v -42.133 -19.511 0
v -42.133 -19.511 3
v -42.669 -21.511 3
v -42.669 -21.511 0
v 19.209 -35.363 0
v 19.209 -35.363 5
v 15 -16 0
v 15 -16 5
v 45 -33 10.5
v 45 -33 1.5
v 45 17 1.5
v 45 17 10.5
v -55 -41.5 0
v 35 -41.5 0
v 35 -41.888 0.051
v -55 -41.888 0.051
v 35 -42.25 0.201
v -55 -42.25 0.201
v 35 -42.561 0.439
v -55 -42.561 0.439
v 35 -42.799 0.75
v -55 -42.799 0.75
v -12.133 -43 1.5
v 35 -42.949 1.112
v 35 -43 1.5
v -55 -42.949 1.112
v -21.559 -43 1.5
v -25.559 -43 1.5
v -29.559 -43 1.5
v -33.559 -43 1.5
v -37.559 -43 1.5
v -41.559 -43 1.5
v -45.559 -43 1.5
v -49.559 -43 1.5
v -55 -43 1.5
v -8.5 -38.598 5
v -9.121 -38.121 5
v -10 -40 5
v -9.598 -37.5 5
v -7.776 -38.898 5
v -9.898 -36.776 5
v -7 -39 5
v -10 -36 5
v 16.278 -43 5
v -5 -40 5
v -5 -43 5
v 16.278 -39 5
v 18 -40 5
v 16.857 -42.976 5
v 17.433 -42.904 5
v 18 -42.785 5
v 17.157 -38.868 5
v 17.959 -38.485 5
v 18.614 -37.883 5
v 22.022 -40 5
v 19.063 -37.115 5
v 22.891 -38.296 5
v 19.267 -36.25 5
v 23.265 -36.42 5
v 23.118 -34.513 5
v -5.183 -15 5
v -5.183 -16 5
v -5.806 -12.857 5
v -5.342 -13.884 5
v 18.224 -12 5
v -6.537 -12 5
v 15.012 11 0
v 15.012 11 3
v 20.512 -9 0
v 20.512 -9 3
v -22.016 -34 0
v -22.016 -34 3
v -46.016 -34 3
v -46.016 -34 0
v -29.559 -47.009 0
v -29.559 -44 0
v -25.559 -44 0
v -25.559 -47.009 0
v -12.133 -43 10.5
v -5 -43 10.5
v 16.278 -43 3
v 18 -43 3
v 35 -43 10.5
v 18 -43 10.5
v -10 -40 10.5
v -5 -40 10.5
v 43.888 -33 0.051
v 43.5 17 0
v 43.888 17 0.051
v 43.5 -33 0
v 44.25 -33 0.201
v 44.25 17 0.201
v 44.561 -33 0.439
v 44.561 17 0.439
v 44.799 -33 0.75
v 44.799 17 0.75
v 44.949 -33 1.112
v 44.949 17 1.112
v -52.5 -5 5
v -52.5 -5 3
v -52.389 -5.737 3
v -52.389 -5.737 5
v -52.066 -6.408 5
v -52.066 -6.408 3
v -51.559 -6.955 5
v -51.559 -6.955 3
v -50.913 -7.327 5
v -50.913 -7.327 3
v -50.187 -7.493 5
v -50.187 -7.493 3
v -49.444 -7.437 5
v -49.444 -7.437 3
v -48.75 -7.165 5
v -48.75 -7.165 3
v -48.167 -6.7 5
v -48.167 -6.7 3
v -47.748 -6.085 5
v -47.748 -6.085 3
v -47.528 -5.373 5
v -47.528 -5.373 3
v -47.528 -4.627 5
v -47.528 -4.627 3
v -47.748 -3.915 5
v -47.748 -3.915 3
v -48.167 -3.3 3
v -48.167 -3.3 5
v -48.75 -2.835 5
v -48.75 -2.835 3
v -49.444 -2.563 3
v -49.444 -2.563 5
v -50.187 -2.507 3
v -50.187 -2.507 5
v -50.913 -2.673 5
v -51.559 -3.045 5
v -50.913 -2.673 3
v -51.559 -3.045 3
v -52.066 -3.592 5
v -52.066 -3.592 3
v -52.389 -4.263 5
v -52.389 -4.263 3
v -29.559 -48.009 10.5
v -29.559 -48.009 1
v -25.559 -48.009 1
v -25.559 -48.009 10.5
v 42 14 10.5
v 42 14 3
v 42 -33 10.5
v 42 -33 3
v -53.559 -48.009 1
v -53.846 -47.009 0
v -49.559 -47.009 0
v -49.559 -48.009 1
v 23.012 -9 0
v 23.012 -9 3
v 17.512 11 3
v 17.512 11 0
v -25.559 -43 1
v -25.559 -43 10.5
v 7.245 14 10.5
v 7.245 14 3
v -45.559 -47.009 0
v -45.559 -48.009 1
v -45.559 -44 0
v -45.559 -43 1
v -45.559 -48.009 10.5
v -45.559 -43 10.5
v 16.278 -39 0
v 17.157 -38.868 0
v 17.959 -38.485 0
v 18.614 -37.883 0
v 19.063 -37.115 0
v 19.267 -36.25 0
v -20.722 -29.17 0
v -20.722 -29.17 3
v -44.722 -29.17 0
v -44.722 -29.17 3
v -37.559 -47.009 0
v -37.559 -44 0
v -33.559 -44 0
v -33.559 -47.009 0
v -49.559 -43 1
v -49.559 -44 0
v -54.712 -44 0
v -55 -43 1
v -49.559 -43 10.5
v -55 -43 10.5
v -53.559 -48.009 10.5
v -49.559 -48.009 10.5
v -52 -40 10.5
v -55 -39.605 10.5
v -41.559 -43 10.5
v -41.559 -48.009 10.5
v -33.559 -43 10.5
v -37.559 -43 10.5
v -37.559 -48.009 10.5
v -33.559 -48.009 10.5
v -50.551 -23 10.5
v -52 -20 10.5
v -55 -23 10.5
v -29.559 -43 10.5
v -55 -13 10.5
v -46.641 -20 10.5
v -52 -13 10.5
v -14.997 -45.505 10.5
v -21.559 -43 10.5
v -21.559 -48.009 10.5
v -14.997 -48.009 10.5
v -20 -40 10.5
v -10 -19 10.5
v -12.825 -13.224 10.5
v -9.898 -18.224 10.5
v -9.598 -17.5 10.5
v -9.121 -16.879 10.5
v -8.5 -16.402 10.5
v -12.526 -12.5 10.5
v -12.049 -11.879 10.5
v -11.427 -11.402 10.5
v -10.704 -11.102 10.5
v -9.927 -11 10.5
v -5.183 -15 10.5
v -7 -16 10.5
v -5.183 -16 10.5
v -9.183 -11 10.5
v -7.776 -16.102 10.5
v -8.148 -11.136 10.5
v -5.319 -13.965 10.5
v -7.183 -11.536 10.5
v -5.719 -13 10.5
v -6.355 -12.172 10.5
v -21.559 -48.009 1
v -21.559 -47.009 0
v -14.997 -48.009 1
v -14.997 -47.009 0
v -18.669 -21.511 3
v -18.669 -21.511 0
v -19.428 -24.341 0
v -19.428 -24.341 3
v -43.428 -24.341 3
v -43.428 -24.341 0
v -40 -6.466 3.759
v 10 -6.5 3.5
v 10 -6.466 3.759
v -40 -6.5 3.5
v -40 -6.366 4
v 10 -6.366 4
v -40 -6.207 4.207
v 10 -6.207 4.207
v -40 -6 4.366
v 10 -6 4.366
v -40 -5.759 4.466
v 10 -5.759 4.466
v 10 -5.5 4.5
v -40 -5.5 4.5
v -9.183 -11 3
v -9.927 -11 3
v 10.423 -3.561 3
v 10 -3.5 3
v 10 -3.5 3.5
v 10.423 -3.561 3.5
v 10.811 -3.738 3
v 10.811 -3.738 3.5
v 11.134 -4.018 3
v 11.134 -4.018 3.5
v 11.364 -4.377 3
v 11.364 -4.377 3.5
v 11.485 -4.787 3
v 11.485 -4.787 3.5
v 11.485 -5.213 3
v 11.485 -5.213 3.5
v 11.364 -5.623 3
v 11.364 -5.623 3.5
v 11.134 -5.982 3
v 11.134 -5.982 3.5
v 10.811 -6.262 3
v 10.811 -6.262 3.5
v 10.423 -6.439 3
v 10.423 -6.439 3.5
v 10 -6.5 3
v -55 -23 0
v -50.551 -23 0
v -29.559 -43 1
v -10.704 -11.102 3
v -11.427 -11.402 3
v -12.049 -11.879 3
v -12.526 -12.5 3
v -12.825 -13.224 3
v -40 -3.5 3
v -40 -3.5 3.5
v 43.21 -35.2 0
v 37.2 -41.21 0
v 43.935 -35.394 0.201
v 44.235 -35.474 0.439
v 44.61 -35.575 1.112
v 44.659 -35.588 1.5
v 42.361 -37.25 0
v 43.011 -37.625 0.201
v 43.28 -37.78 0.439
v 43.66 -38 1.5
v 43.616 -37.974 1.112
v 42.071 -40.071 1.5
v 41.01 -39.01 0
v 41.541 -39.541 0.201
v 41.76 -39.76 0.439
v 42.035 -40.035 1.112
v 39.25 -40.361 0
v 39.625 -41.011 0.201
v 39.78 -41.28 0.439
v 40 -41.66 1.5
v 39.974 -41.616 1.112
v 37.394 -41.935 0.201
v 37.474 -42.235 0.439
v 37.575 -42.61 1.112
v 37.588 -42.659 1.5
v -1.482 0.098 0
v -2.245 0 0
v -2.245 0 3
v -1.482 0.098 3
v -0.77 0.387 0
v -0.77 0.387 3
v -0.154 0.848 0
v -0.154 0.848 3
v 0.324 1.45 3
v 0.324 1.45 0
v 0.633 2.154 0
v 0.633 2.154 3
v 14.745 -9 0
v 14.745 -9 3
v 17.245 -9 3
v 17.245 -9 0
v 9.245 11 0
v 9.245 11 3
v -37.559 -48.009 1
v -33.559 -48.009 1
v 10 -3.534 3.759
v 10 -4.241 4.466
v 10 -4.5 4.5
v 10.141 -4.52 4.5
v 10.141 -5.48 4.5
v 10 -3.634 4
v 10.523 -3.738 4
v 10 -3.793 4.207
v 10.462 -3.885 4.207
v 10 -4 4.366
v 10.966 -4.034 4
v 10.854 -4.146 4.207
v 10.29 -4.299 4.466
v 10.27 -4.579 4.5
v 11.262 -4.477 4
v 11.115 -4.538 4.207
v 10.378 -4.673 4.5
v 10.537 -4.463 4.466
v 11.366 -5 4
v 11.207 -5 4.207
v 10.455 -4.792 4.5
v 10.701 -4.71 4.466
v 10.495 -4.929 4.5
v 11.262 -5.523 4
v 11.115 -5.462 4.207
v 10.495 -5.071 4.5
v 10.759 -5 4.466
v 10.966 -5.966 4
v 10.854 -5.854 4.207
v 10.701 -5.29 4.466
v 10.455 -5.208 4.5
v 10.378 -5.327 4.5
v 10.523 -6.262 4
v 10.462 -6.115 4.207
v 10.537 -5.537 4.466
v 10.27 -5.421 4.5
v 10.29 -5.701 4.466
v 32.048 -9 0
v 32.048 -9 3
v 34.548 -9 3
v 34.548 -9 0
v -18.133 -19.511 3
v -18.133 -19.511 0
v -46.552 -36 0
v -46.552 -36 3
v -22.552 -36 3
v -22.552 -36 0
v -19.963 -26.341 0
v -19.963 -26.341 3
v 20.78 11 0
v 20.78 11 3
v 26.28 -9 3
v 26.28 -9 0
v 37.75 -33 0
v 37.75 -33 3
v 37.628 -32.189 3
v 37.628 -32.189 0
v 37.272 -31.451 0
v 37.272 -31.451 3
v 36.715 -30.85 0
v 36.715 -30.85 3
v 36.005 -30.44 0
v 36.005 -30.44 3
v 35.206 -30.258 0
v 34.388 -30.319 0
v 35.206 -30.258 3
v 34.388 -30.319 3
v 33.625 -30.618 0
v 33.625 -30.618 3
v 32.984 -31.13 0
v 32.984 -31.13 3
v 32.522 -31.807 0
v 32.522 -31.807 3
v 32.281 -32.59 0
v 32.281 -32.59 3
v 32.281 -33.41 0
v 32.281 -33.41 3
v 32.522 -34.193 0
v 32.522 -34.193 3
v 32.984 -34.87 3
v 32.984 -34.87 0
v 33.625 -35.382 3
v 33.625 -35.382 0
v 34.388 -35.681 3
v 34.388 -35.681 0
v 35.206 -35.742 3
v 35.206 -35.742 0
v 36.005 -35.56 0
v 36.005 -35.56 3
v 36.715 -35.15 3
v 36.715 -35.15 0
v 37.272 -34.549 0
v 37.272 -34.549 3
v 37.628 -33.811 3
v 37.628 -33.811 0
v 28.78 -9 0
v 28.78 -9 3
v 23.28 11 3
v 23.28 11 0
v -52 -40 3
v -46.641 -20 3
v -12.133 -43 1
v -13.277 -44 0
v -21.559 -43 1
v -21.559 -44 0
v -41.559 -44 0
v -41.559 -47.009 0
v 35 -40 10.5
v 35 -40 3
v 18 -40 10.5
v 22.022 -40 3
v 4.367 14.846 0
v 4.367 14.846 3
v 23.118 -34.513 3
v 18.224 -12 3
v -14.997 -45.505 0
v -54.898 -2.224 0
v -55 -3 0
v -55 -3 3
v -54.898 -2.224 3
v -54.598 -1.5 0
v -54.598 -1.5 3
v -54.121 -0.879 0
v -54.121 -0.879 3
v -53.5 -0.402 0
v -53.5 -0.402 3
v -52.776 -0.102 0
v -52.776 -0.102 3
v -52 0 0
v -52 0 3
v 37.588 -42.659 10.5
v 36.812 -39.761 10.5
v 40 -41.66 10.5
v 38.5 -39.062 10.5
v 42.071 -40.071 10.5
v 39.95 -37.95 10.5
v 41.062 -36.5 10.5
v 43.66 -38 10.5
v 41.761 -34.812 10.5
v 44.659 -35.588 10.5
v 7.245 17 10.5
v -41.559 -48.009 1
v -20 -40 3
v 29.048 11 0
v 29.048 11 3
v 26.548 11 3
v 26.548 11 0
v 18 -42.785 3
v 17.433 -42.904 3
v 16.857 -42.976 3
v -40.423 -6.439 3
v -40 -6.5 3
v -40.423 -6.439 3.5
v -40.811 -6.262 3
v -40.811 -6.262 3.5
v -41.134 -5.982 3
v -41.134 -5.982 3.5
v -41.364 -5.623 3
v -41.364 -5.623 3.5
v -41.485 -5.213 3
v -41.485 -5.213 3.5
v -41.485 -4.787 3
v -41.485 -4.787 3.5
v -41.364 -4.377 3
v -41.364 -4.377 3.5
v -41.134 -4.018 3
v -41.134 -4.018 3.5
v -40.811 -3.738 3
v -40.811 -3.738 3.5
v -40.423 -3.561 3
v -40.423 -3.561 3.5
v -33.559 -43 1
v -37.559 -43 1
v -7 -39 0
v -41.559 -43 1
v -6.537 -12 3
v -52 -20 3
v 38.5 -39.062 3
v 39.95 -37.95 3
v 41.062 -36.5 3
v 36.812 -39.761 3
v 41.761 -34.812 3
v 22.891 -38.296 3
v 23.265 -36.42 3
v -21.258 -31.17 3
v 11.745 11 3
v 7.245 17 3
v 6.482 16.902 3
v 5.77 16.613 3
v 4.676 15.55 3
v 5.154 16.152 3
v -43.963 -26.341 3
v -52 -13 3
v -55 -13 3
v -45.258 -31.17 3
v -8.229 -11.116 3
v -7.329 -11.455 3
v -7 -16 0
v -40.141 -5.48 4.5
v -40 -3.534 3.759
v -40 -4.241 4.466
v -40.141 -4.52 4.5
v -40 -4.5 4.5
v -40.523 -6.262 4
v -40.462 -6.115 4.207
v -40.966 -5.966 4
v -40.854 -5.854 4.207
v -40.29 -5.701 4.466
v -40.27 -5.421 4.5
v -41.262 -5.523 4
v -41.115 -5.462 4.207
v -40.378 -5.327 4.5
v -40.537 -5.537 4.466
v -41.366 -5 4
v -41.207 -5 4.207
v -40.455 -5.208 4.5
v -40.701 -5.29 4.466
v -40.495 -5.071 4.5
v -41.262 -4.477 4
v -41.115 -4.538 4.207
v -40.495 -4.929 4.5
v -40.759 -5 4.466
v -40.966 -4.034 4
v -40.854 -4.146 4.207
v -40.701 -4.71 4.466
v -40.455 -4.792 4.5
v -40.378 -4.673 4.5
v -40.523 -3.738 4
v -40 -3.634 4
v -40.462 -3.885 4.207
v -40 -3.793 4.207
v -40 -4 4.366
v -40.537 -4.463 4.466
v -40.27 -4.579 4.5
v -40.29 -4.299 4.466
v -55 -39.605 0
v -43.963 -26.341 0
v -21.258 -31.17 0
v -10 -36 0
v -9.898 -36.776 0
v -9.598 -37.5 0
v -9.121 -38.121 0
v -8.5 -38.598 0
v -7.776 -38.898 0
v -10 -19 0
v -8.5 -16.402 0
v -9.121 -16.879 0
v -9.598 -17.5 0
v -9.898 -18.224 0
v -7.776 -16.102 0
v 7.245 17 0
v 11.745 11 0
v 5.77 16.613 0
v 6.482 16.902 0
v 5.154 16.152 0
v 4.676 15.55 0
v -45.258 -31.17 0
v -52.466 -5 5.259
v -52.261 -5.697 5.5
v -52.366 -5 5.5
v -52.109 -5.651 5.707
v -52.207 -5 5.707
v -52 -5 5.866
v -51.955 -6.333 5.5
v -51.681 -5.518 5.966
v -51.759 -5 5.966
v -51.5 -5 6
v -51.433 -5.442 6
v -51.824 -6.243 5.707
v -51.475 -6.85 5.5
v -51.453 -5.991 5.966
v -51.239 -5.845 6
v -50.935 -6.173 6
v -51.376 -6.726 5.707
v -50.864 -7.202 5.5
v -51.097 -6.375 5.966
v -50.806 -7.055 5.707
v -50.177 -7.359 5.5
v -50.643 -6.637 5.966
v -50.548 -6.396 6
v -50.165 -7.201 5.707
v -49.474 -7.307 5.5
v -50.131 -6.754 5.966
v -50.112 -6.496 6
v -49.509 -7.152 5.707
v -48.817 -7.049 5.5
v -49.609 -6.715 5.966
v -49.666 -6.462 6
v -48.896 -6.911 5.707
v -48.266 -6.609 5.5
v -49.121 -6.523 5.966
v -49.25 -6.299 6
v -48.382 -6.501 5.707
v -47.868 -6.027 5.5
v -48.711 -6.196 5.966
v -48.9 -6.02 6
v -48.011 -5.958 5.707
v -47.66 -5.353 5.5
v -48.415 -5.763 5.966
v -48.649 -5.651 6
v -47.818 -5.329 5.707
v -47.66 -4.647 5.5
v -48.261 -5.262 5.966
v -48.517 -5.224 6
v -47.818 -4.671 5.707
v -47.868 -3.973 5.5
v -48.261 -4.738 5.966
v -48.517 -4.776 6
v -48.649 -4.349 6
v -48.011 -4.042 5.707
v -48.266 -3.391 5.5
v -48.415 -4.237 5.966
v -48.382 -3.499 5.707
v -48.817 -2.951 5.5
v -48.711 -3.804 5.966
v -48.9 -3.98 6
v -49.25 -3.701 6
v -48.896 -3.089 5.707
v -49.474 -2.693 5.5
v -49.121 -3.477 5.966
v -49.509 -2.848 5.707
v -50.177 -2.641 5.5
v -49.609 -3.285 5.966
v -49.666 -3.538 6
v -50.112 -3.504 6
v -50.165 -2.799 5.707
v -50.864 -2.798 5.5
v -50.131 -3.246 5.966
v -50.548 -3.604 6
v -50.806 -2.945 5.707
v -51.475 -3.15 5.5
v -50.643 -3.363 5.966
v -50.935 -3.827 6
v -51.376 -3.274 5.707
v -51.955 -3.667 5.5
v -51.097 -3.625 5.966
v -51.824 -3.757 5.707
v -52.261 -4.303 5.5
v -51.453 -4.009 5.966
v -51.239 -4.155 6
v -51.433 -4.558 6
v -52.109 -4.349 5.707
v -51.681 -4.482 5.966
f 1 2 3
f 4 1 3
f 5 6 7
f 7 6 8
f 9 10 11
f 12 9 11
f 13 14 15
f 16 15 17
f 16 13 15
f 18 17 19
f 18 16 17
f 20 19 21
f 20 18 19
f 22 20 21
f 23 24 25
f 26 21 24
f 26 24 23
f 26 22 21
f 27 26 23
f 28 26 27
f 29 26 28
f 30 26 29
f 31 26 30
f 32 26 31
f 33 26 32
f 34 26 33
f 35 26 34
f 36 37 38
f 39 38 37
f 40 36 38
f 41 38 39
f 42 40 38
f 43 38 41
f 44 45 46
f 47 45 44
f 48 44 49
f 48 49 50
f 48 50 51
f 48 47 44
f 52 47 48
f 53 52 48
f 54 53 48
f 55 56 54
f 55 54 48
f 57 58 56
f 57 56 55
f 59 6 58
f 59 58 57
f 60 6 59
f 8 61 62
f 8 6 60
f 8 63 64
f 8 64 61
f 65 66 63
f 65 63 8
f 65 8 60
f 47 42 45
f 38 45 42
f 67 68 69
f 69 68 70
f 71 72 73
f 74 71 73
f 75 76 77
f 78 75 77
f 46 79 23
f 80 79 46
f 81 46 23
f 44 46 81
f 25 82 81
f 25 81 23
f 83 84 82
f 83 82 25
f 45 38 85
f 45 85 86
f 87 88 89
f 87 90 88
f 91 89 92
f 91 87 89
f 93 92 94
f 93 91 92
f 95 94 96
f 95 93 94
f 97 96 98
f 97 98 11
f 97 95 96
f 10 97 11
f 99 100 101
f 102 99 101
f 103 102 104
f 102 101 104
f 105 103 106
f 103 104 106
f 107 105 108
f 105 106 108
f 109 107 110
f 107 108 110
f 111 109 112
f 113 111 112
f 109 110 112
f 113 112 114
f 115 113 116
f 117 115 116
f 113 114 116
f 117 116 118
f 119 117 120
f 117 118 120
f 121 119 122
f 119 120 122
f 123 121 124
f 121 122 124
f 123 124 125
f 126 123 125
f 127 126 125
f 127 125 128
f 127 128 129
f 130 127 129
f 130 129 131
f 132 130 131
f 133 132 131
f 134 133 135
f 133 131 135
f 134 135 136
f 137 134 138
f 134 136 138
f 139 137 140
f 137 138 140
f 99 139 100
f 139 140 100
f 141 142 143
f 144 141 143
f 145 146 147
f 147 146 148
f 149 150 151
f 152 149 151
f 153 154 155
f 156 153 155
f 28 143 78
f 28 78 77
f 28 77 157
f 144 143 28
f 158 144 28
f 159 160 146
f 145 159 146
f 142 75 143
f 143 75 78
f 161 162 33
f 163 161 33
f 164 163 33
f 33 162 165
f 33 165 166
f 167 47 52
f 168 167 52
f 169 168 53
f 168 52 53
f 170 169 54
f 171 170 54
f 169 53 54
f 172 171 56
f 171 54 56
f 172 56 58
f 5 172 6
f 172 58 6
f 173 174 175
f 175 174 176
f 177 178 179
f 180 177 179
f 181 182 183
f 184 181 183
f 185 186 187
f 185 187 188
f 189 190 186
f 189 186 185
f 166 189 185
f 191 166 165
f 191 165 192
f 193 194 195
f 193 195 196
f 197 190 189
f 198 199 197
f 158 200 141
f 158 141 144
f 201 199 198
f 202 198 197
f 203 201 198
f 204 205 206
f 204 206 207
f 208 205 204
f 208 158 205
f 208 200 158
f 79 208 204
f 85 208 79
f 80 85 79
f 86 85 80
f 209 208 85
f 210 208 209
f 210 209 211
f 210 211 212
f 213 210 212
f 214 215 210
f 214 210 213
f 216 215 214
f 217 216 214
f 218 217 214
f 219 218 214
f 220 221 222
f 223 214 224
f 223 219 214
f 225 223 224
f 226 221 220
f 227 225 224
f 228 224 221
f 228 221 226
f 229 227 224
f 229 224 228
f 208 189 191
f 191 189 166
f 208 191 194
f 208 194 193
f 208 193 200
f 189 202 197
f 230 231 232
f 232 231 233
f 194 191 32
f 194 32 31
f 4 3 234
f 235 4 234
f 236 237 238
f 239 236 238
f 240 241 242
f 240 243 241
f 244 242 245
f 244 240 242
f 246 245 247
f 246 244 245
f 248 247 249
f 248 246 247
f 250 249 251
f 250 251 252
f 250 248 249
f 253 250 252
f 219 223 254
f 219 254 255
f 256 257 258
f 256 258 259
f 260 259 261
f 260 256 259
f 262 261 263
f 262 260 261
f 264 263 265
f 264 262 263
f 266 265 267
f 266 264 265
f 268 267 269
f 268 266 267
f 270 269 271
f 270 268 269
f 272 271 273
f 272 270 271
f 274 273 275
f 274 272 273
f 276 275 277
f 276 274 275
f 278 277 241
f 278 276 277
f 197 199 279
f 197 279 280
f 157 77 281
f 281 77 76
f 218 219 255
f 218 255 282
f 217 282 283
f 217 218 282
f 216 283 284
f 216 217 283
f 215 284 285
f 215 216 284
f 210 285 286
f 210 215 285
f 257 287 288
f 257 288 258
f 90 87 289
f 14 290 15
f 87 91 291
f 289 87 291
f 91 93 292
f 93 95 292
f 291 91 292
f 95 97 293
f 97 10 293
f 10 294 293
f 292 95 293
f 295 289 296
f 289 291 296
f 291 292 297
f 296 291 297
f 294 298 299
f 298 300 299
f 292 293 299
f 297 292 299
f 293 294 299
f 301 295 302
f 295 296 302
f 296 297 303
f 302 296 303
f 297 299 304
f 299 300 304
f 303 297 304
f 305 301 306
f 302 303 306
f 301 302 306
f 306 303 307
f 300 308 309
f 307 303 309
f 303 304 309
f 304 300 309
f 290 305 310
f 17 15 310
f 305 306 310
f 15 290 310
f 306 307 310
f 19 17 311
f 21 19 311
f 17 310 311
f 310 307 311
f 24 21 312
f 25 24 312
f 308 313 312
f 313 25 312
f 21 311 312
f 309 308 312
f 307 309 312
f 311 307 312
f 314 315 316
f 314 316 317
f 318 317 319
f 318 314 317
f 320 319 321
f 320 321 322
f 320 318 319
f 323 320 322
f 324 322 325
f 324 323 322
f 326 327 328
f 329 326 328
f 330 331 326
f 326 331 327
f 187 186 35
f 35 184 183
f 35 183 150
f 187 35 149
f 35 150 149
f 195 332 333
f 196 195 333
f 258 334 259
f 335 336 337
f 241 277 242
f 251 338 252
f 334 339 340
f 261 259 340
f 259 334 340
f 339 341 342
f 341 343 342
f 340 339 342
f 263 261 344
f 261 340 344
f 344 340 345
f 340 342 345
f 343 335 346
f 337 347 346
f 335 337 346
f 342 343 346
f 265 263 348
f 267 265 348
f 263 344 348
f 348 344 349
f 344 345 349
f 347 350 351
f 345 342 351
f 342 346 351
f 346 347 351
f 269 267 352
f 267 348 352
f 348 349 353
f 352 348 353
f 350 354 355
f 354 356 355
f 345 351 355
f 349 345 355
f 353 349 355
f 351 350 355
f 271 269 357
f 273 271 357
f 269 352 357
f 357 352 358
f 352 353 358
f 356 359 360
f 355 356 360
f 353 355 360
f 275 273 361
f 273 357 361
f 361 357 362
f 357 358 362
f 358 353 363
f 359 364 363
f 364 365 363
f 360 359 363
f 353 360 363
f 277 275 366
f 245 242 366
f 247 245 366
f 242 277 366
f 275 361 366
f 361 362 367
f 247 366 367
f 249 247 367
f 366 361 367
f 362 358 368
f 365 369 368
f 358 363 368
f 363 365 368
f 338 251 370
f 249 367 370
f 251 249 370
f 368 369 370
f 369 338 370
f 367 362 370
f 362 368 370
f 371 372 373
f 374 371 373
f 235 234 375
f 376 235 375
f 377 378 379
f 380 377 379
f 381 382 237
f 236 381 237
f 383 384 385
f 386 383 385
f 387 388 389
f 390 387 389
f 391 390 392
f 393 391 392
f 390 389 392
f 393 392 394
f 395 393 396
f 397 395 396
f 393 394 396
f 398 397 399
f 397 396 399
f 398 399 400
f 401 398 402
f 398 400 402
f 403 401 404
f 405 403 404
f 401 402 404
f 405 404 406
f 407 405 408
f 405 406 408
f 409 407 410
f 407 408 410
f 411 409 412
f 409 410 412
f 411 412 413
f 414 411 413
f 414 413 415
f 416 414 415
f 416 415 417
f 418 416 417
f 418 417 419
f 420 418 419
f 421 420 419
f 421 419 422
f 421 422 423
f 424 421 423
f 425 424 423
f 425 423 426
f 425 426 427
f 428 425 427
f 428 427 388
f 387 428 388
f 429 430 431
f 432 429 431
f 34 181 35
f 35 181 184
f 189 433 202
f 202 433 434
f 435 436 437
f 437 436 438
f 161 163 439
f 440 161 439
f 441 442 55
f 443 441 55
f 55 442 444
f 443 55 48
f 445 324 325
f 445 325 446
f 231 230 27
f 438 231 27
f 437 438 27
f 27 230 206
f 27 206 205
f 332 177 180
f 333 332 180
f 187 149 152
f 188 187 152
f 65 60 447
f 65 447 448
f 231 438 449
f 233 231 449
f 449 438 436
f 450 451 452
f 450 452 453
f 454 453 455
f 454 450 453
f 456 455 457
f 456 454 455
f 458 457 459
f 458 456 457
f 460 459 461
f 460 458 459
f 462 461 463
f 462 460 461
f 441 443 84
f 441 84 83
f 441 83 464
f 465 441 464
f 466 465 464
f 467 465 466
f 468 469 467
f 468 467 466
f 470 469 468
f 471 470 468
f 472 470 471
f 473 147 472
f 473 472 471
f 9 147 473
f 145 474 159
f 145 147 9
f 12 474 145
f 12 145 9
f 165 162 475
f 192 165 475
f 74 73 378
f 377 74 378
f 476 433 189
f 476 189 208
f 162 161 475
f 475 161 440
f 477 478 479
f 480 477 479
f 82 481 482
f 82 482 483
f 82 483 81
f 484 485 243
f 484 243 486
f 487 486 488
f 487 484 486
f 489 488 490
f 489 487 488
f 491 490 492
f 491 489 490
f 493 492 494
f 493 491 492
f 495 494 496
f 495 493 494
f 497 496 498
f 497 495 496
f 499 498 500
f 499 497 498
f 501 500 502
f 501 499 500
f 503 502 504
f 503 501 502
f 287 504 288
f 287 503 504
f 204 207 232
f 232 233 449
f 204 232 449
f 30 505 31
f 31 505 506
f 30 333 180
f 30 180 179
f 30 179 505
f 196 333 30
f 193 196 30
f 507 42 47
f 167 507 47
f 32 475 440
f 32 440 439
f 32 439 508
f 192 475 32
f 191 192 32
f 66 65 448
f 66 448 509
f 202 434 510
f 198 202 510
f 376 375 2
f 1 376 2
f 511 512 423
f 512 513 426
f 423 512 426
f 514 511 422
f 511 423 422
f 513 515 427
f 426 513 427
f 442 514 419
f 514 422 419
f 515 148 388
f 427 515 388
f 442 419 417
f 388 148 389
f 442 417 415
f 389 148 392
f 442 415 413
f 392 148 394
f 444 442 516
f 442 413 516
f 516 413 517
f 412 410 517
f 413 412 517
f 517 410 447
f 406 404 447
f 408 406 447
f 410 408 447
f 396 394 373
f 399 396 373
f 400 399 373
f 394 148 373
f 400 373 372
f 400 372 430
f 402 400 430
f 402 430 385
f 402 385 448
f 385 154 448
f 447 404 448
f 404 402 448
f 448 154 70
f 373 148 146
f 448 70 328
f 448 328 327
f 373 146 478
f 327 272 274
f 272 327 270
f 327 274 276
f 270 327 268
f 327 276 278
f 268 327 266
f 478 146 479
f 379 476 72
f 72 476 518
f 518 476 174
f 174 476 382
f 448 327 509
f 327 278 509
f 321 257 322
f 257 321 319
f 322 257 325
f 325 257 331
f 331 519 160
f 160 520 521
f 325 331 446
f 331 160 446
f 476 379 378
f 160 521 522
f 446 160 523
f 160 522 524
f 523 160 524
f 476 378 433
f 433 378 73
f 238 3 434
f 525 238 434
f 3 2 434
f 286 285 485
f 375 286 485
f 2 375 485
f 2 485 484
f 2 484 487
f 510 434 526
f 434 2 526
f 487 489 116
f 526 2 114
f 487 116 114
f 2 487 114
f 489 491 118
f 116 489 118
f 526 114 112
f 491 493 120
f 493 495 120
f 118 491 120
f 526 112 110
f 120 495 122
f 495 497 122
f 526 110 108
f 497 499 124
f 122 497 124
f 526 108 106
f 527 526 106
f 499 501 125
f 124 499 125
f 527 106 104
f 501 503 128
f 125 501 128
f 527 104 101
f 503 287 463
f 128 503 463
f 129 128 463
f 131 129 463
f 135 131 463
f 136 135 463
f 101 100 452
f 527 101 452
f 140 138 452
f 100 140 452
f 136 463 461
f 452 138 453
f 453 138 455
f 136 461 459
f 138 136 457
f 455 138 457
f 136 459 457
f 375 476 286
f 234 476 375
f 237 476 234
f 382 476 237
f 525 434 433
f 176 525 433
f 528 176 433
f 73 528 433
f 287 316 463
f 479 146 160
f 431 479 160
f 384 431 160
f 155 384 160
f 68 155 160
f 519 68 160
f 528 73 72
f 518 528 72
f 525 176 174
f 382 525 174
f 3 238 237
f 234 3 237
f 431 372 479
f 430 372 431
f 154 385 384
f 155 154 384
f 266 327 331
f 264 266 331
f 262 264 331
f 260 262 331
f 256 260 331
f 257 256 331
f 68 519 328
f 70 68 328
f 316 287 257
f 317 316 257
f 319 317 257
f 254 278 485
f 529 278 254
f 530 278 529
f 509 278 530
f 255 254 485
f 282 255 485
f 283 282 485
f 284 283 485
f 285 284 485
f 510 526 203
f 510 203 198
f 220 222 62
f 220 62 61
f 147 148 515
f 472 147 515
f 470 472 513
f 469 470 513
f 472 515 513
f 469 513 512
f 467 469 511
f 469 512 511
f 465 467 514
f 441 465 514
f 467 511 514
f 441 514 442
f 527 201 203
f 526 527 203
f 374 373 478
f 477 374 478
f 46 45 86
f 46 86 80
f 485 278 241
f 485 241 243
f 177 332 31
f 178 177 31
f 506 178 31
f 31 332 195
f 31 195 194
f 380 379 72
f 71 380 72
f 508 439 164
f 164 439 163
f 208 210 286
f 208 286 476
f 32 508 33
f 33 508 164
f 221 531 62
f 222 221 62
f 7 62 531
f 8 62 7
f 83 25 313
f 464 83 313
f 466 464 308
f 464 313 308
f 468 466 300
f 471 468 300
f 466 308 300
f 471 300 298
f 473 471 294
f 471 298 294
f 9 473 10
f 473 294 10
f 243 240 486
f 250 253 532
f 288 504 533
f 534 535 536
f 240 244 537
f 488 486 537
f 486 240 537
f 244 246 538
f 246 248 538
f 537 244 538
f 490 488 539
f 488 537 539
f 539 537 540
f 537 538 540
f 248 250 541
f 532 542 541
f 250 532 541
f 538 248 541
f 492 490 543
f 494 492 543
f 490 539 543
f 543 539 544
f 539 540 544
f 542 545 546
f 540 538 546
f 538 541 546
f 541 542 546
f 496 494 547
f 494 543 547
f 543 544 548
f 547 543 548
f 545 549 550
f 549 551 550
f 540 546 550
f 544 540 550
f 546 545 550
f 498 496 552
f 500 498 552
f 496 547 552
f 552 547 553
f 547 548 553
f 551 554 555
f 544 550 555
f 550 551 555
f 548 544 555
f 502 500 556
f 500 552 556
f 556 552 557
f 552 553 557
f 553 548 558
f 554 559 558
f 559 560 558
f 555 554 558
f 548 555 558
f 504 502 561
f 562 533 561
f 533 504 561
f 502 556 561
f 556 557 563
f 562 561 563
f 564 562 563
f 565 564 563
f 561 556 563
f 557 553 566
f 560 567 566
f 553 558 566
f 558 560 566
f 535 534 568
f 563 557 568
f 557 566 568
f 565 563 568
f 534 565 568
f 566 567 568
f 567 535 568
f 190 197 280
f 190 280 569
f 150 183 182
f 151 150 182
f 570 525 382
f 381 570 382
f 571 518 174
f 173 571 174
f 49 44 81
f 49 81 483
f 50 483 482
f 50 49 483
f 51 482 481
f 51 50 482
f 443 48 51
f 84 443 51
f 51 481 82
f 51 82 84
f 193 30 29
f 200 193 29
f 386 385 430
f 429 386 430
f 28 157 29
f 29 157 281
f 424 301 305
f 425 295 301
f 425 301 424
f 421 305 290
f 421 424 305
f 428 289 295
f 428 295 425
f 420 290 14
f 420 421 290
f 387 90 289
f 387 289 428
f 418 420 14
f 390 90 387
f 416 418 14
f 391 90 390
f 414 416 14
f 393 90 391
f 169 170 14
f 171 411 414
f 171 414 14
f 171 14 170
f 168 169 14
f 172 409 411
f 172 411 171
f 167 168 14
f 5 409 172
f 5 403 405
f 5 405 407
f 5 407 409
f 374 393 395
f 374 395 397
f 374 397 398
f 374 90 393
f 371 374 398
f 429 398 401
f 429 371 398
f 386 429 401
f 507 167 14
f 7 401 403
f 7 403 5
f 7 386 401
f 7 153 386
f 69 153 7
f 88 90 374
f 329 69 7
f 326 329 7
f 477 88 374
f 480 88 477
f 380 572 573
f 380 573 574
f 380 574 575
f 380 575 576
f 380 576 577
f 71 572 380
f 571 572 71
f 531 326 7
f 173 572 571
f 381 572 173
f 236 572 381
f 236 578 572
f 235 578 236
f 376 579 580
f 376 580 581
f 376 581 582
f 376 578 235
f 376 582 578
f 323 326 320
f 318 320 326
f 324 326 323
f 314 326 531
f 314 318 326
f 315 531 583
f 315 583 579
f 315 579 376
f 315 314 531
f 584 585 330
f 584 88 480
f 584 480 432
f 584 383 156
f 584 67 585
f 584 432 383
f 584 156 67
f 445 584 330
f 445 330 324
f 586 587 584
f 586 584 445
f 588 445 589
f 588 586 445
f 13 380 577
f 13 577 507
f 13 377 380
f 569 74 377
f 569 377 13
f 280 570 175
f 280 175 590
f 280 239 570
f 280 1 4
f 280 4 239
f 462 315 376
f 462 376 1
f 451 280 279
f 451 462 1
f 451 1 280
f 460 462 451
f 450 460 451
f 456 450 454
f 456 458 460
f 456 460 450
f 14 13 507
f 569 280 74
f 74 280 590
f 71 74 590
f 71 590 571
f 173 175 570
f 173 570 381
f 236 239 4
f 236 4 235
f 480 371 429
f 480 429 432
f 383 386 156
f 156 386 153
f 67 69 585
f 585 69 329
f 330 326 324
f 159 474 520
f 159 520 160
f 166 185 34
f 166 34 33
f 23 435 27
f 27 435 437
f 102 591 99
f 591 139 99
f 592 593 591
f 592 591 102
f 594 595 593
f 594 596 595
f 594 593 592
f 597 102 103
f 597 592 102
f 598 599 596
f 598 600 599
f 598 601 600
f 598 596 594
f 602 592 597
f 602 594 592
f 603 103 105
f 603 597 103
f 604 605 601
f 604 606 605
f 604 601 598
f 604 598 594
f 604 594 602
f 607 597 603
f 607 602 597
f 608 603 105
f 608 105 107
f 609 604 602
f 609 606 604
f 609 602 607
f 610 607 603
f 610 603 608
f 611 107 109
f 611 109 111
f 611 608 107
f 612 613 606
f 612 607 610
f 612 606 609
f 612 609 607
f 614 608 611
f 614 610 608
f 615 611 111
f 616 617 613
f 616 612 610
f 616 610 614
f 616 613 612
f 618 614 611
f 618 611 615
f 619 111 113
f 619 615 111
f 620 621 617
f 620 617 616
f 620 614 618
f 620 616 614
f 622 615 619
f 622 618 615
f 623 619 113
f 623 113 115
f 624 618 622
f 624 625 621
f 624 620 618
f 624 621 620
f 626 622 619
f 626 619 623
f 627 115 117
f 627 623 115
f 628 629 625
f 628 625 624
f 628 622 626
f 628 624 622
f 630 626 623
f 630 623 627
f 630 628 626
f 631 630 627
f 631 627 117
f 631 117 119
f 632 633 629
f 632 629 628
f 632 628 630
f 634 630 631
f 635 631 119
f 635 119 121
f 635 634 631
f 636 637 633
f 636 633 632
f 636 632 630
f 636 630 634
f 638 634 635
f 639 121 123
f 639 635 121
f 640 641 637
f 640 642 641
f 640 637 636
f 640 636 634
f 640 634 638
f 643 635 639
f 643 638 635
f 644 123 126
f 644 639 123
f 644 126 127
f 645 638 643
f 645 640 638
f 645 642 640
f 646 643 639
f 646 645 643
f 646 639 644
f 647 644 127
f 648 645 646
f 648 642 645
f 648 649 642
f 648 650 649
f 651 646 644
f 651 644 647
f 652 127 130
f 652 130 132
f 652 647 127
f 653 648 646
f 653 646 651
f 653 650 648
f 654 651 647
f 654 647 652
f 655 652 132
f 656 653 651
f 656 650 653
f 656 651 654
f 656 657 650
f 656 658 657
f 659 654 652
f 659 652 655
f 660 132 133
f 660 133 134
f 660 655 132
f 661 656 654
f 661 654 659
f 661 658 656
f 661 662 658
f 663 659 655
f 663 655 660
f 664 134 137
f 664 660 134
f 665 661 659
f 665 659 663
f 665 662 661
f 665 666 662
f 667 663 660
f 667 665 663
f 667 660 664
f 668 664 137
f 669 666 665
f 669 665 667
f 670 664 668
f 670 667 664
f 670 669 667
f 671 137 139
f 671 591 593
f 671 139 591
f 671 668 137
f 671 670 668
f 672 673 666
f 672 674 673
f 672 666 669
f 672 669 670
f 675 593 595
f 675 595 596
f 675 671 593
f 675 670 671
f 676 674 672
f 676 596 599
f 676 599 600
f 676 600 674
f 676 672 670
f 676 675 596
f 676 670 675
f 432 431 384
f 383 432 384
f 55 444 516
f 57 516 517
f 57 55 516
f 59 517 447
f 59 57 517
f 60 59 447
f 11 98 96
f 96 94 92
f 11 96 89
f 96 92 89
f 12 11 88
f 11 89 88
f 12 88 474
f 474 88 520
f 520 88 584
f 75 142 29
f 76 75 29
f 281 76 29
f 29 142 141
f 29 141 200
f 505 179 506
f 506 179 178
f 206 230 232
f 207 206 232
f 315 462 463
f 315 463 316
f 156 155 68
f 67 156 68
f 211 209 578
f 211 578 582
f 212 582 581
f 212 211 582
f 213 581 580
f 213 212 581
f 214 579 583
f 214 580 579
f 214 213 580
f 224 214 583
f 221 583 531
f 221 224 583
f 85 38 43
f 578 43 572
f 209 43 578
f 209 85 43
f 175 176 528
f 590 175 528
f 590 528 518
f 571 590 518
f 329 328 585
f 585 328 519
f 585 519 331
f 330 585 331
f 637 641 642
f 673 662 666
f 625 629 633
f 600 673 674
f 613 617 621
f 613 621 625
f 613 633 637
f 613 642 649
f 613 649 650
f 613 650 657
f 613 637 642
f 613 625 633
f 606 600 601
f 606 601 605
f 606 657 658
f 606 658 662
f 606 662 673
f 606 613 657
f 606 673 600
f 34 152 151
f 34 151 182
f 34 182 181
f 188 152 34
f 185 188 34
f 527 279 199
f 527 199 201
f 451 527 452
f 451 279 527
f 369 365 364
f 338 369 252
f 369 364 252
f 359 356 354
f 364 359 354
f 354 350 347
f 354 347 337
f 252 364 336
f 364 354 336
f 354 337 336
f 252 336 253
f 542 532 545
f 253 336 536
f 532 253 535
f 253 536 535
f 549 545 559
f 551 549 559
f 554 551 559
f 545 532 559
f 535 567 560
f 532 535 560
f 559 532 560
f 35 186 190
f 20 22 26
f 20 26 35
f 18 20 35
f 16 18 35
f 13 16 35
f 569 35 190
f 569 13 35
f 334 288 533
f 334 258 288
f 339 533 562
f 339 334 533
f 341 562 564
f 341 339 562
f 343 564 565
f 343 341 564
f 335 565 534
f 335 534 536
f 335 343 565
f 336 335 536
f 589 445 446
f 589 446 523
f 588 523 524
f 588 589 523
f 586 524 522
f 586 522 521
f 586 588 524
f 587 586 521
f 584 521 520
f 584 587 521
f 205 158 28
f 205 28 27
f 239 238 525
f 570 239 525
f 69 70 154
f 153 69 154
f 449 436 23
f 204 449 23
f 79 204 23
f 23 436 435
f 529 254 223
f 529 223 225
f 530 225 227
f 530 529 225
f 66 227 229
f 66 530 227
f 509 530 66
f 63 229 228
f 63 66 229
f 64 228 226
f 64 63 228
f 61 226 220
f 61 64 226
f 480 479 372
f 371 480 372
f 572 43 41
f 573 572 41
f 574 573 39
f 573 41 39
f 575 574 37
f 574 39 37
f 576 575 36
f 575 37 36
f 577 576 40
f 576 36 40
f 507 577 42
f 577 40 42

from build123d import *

# Parameters (mm, degrees)
BOSS_EXTRUDE1_DEPTH = 3
CUT_EXTRUDE1_DEPTH  = 70.878465925
BOSS_EXTRUDE2_DEPTH = 7.5
BOSS_EXTRUDE3_START = 2
BOSS_EXTRUDE3_DEPTH = 2
CUT_EXTRUDE2_DEPTH  = 71.215738976
BOSS_EXTRUDE4_DEPTH = 7.5
CUT_EXTRUDE3_DEPTH  = 71.599220959
BOSS_EXTRUDE5_START = 7.5
BOSS_EXTRUDE5_DEPTH = 7.5
SKETCH10_R          = 2.5
BOSS_EXTRUDE6_DEPTH = 3
FILLET2_R           = 1
SKETCH11_R          = 2.75
CUT_EXTRUDE5_DEPTH  = 71.215738976
FILLET3_R           = 1.5
CUT_EXTRUDE6_DEPTH  = 71.215738976
BOSS_EXTRUDE7_DEPTH = 10.5
CHAMFER1_SIZE       = 1
SKETCH14_W          = 4
SKETCH14_H          = 5.009213965
CUT_EXTRUDE7_DEPTH  = 74.75726829
BOSS_EXTRUDE8_DEPTH = 1.5
FILLET4_R           = 1
FILLET5_R           = 4


with BuildPart() as part:
    # Sketch1 → Boss-Extrude1 (new body)
    with BuildSketch(Plane.XY):
        with BuildLine():
            Line((0.633382655, 2.153501028), (4.366617345, 14.846498972))
            ThreePointArc((4.366617345, 14.846498972), (5.447423794, 16.40203007), (7.244713849, 17))
            Line((7.244713849, 17), (45, 17))
            Line((45, 17), (45, -33))
            ThreePointArc((45, -33), (42.071067812, -40.071067812), (35, -43))
            Line((35, -43), (-55, -43))
            Line((-55, -43), (-55, -3))
            ThreePointArc((-55, -3), (-54.121320344, -0.878679656), (-52, 0))
            Line((-52, 0), (-2.244713849, 0))
            ThreePointArc((-2.244713849, 0), (-0.447423794, 0.59796993), (0.633382655, 2.153501028))
        make_face()
    extrude(amount=BOSS_EXTRUDE1_DEPTH)

    # Sketch2 → Cut-Extrude1 (cut, through all)
    with BuildSketch(Plane.XY.offset(3)):
        with BuildLine():
            Line((-7, -16), (15, -16))
            Line((15, -16), (19.209285015, -35.362711067))
            ThreePointArc((19.209285015, -35.362711067), (18.613549878, -37.882569149), (16.277755923, -39))
            Line((16.277755923, -39), (-7, -39))
            ThreePointArc((-7, -39), (-9.121320344, -38.121320344), (-10, -36))
            Line((-10, -36), (-10, -19))
            ThreePointArc((-10, -19), (-9.121320344, -16.878679656), (-7, -16))
        make_face()
    extrude(amount=-CUT_EXTRUDE1_DEPTH, mode=Mode.SUBTRACT)

    # Sketch3 → Boss-Extrude2 (add)
    with BuildSketch(Plane.XY.offset(3)):
        with BuildLine():
            Line((45, -33), (45, 17))
            Line((45, 17), (7.244713849, 17))
            Line((7.244713849, 17), (7.244713849, 14))
            Line((7.244713849, 14), (42, 14))
            Line((42, 14), (42, -33))
            ThreePointArc((42, -33), (39.949747468, -37.949747468), (35, -40))
            Line((35, -40), (18, -40))
            Line((18, -40), (18, -43))
            Line((18, -43), (35, -43))
            ThreePointArc((35, -43), (42.071067812, -40.071067812), (45, -33))
        make_face()
        Polygon((-5, -43), (-55, -43), (-55, -13), (-52, -13), (-52, -40), (-5, -40), align=None)
    extrude(amount=BOSS_EXTRUDE2_DEPTH)

    # Sketch4 → Boss-Extrude3 (add)
    with BuildSketch(Plane.XY.offset(3).offset(BOSS_EXTRUDE3_START)):
        with BuildLine():
            Line((18.223861668, -12), (-7, -12))
            ThreePointArc((-7, -12), (-11.949747468, -14.050252532), (-14, -19))
            Line((-14, -19), (-14, -36))
            ThreePointArc((-14, -36), (-11.949747468, -40.949747468), (-7, -43))
            Line((-7, -43), (16.277755923, -43))
            ThreePointArc((16.277755923, -43), (21.727941817, -40.392661348), (23.11799047, -34.51299249))
            Line((23.11799047, -34.51299249), (18.223861668, -12))
        make_face()
        with BuildLine():
            Line((15, -16), (-7, -16))
            ThreePointArc((-7, -16), (-9.121320344, -16.878679656), (-10, -19))
            Line((-10, -19), (-10, -36))
            ThreePointArc((-10, -36), (-9.121320344, -38.121320344), (-7, -39))
            Line((-7, -39), (16.277755923, -39))
            ThreePointArc((16.277755923, -39), (18.613549878, -37.882569149), (19.209285015, -35.362711067))
            Line((19.209285015, -35.362711067), (15, -16))
        make_face(mode=Mode.SUBTRACT)
    extrude(amount=-BOSS_EXTRUDE3_DEPTH)

    # Sketch5 → Cut-Extrude2 (cut, through all)
    with BuildSketch(Plane.XY.offset(3)):
        Polygon((9.244713849, 11), (14.744713849, -9), (17.244713849, -9), (11.744713849, 11), align=None)
        Polygon((23.012478168, -9), (17.512478168, 11), (15.012478168, 11), (20.512478168, -9), align=None)
        Polygon((28.780242487, -9), (23.280242487, 11), (20.780242487, 11), (26.280242487, -9), align=None)
        Polygon((34.548006805, -9), (29.048006805, 11), (26.548006805, 11), (32.048006805, -9), align=None)
    extrude(amount=-CUT_EXTRUDE2_DEPTH, mode=Mode.SUBTRACT)

    # Sketch6 → Boss-Extrude4 (add)
    with BuildSketch(Plane.XY.offset(3)):
        Polygon((-52, -40), (-46.641016151, -20), (-52, -20), align=None)
    extrude(amount=BOSS_EXTRUDE4_DEPTH)

    # Sketch7 → Cut-Extrude3 (cut, through all)
    with BuildSketch(Plane.XY.offset(10.5)):
        Polygon((-55, -39.605042507), (-55, -23), (-50.55069227, -23), align=None)
    extrude(amount=-CUT_EXTRUDE3_DEPTH, mode=Mode.SUBTRACT)

    # Sketch8 → Boss-Extrude5 (add)
    with BuildSketch(Plane.XY.offset(3).offset(BOSS_EXTRUDE5_START)):
        with BuildLine():
            Line((-10, -40), (-10, -19))
            ThreePointArc((-10, -19), (-9.121320344, -16.878679656), (-7, -16))
            Line((-7, -16), (-5.183058398, -16))
            Line((-5.183058398, -16), (-5.183058398, -11))
            Line((-5.183058398, -11), (-9.927492456, -11))
            ThreePointArc((-9.927492456, -11), (-11.753776743, -11.619939979), (-12.825269934, -13.223542865))
            Line((-12.825269934, -13.223542865), (-20, -40))
            Line((-20, -40), (-10, -40))
        make_face()
    extrude(amount=-BOSS_EXTRUDE5_DEPTH)

    # Sketch10 → Boss-Extrude6 (add)
    with BuildSketch(Plane.XY.offset(3)):
        with Locations(Location((-50, -5, 0), (0, 0, 180))):
            Circle(SKETCH10_R)
    extrude(amount=BOSS_EXTRUDE6_DEPTH)

    # Fillet2
    fillet2_edges = [part.edges().sort_by_distance(p)[0] for p in [
        (-47.5, -5, 6),
    ]]
    fillet(fillet2_edges, radius=FILLET2_R)

    # Sketch11 → Cut-Extrude5 (cut, through all)
    with BuildSketch(Plane.XY.offset(3)):
        with Locations((35, -33)):
            Circle(SKETCH11_R)
    extrude(amount=-CUT_EXTRUDE5_DEPTH, mode=Mode.SUBTRACT)

    # Fillet3
    fillet3_edges = [part.edges().sort_by_distance(p)[0] for p in [
        (45, -8, 0),
        (42.071067812, -40.071067812, 0),
        (-10, -43, 0),
    ]]
    fillet(fillet3_edges, radius=FILLET3_R)

    # Sketch12 → Cut-Extrude6 (cut, through all)
    with BuildSketch(Plane.XY.offset(3)):
        Polygon((-46.551669862, -36), (-22.551669862, -36), (-22.015771477, -34), (-46.015771477, -34), align=None)
        Polygon((-45.257574636, -31.170370869), (-21.257574636, -31.170370869), (-20.721676251, -29.170370869), (-44.721676251, -29.170370869), align=None)
        Polygon((-43.963479411, -26.340741737), (-19.963479411, -26.340741737), (-19.427581026, -24.340741737), (-43.427581026, -24.340741737), align=None)
        Polygon((-42.669384185, -21.511112606), (-18.669384185, -21.511112606), (-18.1334858, -19.511112606), (-42.1334858, -19.511112606), align=None)
    extrude(amount=-CUT_EXTRUDE6_DEPTH, mode=Mode.SUBTRACT)

    # Sketch13 → Boss-Extrude7 (add)
    with BuildSketch(Plane.XY):
        Polygon((-55, -43), (-53.558551653, -48.009213965), (-14.997432238, -48.009213965), (-14.997432238, -45.504606983), (-12.13347642, -43), align=None)
    extrude(amount=BOSS_EXTRUDE7_DEPTH)

    # Chamfer1
    chamfer1_edges = [part.edges().sort_by_distance(p)[0] for p in [
        (-33.56673821, -43, 0),
        (-34.277991946, -48.009213965, 0),
    ]]
    chamfer(chamfer1_edges, length=CHAMFER1_SIZE)

    # Sketch14 → Cut-Extrude7 (cut, through all)
    with BuildSketch(Plane.XY.offset(10.5)):
        with Locations((-47.558551653, -45.504606983)):
            Rectangle(SKETCH14_W, SKETCH14_H)
        with Locations((-39.558551653, -45.504606983)):
            Rectangle(SKETCH14_W, SKETCH14_H)
        with Locations((-31.558551653, -45.504606983)):
            Rectangle(SKETCH14_W, SKETCH14_H)
        with Locations((-23.558551653, -45.504606983)):
            Rectangle(SKETCH14_W, SKETCH14_H)
    extrude(amount=-CUT_EXTRUDE7_DEPTH, mode=Mode.SUBTRACT)

    # Sketch9 → Boss-Extrude8 (add)
    with BuildSketch(Plane.XY.offset(3)):
        with BuildLine():
            Line((-40, -3.5), (10, -3.5))
            ThreePointArc((10, -3.5), (11.5, -5), (10, -6.5))
            Line((10, -6.5), (-40, -6.5))
            ThreePointArc((-40, -6.5), (-41.5, -5), (-40, -3.5))
        make_face()
    extrude(amount=BOSS_EXTRUDE8_DEPTH)

    # Fillet4
    fillet4_edges = [part.edges().sort_by_distance(p)[0] for p in [
        (-41.5, -5, 4.5),
        (-15, -6.5, 4.5),
        (11.5, -5, 4.5),
        (-15, -3.5, 4.5),
    ]]
    fillet(fillet4_edges, radius=FILLET4_R)

    # Fillet5
    fillet5_edges = [part.edges().sort_by_distance(p)[0] for p in [
        (-5.183058398, -11, 6.75),
    ]]
    fillet(fillet5_edges, radius=FILLET5_R)


solid = part.part
